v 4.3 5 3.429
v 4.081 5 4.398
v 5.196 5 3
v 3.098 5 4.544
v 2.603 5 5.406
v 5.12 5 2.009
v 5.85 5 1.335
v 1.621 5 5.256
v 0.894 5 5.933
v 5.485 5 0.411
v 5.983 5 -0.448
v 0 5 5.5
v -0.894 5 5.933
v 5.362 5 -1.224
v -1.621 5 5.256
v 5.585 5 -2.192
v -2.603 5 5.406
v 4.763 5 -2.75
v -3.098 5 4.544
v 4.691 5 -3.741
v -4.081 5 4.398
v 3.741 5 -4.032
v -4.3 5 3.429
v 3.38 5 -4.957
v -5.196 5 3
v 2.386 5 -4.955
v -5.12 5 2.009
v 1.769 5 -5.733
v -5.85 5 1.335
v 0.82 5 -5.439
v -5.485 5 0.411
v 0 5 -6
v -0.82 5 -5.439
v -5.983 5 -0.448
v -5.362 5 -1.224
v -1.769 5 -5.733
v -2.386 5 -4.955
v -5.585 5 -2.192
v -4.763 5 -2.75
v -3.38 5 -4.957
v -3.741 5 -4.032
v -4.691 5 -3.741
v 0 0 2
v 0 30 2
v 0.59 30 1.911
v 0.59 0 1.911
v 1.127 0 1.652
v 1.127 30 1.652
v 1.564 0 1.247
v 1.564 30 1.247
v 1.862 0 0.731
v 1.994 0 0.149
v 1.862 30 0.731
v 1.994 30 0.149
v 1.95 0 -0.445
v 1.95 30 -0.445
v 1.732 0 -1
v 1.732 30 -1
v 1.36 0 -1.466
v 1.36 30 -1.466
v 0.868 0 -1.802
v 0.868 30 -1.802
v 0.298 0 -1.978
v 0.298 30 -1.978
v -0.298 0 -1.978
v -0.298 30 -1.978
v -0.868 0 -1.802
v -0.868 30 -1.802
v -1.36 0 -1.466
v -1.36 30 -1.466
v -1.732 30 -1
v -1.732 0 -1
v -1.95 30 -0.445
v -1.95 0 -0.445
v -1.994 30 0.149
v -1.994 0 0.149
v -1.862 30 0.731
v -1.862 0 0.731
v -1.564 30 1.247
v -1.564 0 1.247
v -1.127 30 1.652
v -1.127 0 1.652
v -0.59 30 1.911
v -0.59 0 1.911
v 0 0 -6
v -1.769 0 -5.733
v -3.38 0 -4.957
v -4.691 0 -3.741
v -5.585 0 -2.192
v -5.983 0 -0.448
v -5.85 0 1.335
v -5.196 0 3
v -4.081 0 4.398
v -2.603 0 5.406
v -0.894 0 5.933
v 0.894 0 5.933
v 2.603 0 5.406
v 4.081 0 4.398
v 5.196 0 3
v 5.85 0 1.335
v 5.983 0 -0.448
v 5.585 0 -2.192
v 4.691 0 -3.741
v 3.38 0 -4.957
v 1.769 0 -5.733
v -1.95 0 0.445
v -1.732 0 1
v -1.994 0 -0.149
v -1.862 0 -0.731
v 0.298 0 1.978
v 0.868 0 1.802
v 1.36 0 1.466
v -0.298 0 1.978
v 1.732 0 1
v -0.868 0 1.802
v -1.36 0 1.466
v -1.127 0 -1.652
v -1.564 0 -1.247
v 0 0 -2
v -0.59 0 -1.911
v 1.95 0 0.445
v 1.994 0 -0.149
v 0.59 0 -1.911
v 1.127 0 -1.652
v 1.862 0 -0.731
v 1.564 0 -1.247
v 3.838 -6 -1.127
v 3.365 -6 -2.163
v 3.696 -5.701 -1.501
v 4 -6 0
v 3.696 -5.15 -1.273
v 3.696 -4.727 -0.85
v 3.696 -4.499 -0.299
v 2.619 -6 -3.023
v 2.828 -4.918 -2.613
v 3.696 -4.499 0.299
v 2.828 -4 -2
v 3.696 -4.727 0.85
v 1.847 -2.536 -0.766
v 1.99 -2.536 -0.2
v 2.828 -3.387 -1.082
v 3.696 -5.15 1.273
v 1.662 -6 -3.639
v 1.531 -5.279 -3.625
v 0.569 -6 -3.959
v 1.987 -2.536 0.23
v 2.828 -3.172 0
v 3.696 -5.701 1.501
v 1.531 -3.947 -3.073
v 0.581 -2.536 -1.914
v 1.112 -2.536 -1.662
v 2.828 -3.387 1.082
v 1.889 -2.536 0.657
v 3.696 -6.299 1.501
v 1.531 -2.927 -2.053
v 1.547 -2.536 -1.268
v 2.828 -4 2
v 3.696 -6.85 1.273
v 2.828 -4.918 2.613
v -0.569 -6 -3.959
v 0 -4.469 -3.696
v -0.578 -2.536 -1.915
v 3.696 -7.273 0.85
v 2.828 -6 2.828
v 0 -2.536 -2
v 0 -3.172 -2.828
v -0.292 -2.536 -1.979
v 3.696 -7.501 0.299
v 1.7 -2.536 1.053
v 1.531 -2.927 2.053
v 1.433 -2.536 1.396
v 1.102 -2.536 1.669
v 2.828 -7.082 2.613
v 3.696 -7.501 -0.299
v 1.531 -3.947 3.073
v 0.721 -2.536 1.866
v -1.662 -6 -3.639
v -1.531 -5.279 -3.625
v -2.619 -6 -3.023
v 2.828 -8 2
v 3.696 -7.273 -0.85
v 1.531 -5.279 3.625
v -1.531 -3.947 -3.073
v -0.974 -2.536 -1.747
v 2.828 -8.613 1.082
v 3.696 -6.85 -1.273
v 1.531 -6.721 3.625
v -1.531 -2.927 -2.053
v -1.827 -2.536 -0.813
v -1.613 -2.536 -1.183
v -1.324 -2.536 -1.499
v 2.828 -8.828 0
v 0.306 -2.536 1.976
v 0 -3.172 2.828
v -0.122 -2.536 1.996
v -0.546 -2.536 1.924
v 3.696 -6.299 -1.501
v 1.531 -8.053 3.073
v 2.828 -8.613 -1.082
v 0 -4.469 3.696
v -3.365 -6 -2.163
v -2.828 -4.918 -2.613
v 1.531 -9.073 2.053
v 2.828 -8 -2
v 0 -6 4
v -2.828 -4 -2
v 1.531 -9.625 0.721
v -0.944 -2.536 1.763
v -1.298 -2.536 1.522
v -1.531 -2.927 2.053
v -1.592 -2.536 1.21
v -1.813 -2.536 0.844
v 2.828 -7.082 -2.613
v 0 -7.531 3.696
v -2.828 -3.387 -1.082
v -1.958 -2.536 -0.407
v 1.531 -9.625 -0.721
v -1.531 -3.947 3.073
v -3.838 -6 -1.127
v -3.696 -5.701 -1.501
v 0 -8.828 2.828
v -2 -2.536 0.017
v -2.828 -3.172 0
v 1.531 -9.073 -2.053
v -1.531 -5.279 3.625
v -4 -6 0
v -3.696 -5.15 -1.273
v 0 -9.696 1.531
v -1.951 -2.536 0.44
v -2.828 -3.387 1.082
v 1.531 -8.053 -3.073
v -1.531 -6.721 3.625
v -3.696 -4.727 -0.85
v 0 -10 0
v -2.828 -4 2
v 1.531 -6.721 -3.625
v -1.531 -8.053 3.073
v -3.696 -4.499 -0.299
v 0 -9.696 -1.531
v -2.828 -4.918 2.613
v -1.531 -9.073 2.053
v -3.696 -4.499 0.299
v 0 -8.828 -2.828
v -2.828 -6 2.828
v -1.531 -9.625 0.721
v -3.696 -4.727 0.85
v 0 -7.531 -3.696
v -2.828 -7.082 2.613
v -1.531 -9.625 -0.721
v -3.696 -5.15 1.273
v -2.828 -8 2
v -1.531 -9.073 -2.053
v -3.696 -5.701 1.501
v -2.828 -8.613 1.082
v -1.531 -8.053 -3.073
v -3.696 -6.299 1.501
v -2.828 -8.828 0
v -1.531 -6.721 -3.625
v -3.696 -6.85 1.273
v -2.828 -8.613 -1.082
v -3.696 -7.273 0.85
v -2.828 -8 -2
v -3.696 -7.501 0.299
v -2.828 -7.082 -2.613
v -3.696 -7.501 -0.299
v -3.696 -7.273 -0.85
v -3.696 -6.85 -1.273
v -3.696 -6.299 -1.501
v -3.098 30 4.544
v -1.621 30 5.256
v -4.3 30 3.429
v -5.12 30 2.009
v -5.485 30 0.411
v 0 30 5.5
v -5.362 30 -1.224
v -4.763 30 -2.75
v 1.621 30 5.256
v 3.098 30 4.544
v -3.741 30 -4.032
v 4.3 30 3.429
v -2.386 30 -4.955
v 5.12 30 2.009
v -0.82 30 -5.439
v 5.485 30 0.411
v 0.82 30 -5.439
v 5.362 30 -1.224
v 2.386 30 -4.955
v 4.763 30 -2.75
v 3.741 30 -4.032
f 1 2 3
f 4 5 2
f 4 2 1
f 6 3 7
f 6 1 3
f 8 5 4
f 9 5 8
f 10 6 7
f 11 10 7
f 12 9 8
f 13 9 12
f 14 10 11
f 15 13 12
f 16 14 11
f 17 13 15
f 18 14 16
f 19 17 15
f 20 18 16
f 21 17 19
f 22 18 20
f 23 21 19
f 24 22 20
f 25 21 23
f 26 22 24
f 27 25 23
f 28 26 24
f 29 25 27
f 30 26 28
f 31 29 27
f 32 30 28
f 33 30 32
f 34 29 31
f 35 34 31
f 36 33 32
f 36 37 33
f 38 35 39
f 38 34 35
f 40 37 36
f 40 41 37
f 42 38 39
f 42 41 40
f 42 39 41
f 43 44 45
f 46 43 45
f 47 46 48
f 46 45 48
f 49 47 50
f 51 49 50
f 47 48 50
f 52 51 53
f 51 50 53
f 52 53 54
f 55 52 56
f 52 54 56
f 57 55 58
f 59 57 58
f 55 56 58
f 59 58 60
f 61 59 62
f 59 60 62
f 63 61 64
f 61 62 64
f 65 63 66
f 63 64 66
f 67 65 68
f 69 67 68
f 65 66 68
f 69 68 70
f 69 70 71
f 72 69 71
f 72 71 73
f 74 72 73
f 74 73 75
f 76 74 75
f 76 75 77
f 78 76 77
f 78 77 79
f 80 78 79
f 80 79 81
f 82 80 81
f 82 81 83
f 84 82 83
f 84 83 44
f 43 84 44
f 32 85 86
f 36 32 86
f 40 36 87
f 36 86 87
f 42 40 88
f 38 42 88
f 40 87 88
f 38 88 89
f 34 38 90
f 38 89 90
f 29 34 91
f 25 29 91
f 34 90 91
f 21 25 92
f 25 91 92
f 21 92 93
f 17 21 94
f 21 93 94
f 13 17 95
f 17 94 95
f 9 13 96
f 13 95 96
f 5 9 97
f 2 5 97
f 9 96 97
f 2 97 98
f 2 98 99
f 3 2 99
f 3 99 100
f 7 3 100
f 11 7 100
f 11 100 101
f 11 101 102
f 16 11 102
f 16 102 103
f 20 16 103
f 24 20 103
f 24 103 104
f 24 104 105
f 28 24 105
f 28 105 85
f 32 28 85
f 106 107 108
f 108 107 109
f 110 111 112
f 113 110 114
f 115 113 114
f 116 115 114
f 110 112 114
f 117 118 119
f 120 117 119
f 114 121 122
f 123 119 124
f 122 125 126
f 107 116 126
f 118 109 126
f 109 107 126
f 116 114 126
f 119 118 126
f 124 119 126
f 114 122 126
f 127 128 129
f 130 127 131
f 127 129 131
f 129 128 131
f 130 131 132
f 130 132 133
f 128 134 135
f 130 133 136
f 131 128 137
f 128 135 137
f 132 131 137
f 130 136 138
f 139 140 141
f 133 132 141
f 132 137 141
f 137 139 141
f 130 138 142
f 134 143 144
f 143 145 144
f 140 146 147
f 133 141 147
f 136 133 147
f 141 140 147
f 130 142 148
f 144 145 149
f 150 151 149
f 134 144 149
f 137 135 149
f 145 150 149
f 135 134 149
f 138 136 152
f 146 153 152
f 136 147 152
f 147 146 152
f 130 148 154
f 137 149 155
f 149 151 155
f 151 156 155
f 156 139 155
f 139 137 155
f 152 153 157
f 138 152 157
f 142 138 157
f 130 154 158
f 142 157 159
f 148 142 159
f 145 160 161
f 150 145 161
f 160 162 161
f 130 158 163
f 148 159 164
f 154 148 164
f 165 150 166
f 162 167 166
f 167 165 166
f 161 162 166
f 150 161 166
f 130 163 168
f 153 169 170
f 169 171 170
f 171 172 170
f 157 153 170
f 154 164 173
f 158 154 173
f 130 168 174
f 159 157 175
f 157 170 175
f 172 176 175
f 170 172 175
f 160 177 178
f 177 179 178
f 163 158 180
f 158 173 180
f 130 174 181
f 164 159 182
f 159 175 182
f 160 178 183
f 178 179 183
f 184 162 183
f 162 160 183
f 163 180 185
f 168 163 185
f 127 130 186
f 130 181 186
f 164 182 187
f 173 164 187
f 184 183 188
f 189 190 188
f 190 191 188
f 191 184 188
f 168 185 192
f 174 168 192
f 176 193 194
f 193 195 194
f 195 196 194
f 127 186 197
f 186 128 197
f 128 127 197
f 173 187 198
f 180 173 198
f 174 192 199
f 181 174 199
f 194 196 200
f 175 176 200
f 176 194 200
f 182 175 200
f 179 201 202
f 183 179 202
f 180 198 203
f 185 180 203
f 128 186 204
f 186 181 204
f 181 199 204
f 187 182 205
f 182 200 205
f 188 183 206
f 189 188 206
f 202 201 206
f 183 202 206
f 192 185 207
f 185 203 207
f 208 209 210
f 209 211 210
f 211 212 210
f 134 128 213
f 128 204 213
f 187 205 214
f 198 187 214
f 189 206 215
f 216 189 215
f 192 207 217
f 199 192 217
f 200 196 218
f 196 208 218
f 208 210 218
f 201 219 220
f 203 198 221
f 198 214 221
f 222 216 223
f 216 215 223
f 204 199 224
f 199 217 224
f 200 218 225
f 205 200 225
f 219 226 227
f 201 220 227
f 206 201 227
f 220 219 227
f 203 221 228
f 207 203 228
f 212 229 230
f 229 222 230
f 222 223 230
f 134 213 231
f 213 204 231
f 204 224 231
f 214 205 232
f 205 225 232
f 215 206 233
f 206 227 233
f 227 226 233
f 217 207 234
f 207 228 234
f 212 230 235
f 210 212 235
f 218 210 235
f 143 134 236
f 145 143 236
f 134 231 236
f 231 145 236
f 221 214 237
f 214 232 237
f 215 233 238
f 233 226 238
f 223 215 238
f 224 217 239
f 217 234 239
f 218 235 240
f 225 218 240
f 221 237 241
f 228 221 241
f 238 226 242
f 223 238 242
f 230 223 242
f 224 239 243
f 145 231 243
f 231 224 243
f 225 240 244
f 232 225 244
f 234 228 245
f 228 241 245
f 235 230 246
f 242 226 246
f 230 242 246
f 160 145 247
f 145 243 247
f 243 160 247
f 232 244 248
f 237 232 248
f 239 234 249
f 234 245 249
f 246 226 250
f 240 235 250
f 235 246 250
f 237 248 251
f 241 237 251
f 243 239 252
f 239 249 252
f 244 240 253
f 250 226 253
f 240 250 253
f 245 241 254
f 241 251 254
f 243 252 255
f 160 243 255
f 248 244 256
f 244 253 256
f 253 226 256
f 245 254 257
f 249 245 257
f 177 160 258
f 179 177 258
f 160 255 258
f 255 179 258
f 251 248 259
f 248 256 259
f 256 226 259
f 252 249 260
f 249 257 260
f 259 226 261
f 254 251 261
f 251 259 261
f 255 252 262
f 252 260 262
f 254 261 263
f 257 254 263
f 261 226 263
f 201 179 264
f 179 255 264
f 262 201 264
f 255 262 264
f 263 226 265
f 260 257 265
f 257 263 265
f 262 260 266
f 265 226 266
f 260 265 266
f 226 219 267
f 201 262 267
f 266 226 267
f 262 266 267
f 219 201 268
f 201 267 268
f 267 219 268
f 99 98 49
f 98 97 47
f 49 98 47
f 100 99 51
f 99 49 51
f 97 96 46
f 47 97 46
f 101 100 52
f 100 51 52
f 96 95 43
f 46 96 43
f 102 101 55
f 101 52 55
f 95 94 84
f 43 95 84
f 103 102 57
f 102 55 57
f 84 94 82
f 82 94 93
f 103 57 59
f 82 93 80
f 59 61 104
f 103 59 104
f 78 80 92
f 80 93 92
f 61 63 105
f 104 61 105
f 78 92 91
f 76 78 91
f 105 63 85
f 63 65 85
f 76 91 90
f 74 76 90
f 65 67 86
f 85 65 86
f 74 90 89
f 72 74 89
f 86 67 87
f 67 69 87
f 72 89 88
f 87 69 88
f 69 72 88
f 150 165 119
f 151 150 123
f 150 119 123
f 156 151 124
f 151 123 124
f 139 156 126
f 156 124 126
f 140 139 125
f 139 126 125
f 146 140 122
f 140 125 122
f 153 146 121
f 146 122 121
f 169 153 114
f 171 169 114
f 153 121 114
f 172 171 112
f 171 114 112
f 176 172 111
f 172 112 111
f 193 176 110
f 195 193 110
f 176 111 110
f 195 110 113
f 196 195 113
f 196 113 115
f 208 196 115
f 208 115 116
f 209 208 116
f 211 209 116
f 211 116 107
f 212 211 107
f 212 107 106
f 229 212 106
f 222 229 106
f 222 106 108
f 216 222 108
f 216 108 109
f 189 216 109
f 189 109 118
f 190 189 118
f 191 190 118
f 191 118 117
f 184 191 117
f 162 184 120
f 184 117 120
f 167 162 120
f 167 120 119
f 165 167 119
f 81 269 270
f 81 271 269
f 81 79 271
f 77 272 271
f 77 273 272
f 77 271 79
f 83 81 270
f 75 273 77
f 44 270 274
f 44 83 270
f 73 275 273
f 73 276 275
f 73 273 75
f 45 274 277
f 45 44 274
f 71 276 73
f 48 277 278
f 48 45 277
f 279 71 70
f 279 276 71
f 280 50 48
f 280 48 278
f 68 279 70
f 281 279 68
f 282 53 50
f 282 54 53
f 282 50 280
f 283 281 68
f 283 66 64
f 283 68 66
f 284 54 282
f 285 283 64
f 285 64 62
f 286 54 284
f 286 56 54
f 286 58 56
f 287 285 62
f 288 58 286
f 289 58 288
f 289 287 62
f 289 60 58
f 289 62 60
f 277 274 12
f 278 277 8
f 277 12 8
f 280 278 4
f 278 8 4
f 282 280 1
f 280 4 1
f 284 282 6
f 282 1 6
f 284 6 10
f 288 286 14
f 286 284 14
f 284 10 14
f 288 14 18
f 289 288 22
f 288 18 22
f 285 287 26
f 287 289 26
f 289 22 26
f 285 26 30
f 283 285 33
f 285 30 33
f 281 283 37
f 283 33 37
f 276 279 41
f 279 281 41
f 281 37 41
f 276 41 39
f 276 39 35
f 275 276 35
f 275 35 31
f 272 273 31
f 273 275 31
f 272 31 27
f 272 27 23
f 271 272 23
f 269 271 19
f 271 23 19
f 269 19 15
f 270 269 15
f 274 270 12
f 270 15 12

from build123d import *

# Parameters (mm, degrees)
SKETCH1_R           = 6
BOSS_EXTRUDE1_DEPTH = 45
SKETCH7_W           = 15
SKETCH7_H           = 15
CUT_EXTRUDE5_DEPTH  = 25
SKETCH4_R           = 6
SKETCH4_R_2         = 5.5
CUT_EXTRUDE6_DEPTH  = 38
SKETCH5_R           = 2
CUT_EXTRUDE7_DEPTH  = 56
SKETCH8_R           = 2
BOSS_EXTRUDE2_DEPTH = 3


with BuildPart() as part:
    # Sketch1 → Boss-Extrude1 (new body)
    with BuildSketch(Plane(origin=(0, 0, 0), x_dir=(1, 0, 0), z_dir=(0, 1, 0))):
        with Locations(Location((0, 0, 0), (0, 0, 90))):
            Circle(SKETCH1_R)
    extrude(amount=BOSS_EXTRUDE1_DEPTH)

    # Sketch7 → Cut-Extrude5 (cut)
    with BuildSketch(Plane(origin=(0, 30, 0), x_dir=(1, 0, 0), z_dir=(0, 1, 0))):
        Rectangle(SKETCH7_W, SKETCH7_H)
    extrude(amount=CUT_EXTRUDE5_DEPTH, mode=Mode.SUBTRACT)

    # Sketch4 → Cut-Extrude6 (cut)
    with BuildSketch(Plane(origin=(0, 5, 0), x_dir=(1, 0, 0), z_dir=(0, 1, 0))):
        with Locations(Location((0, 0, 0), (0, 0, 90))):
            Circle(SKETCH4_R)
        with Locations(Location((0, 0, 0), (0, 0, 270))):
            Circle(SKETCH4_R_2, mode=Mode.SUBTRACT)
    extrude(amount=CUT_EXTRUDE6_DEPTH, mode=Mode.SUBTRACT)

    # Sketch5 → Cut-Extrude7 (cut)
    with BuildSketch(Plane(origin=(0, 45, 0), x_dir=(1, 0, 0), z_dir=(0, 1, 0))):
        with Locations(Location((0, 0, 0), (0, 0, 270))):
            Circle(SKETCH5_R)
    extrude(amount=-CUT_EXTRUDE7_DEPTH, mode=Mode.SUBTRACT)


with BuildPart() as body_2:
    # Sketch8 → Boss-Extrude2 (new body)
    with BuildSketch(Plane.XZ):
        with Locations(Location((0, 0, 0), (0, 0, 270))):
            Circle(SKETCH8_R)
    extrude(amount=BOSS_EXTRUDE2_DEPTH)

    # Sketch9 → Revolve2 (revolve)
    with BuildSketch(Plane(origin=(0, -6, 0), x_dir=(1, 0, 0), z_dir=(0, 1, 0))):
        with BuildLine():
            Line((-4, 0), (4, 0))
            ThreePointArc((4, 0), (0, 4), (-4, 0))
        make_face()
    revolve(axis=Axis((-4, -6, 0), (1, 0, 0)))


solid = Compound([part.part, body_2.part])
